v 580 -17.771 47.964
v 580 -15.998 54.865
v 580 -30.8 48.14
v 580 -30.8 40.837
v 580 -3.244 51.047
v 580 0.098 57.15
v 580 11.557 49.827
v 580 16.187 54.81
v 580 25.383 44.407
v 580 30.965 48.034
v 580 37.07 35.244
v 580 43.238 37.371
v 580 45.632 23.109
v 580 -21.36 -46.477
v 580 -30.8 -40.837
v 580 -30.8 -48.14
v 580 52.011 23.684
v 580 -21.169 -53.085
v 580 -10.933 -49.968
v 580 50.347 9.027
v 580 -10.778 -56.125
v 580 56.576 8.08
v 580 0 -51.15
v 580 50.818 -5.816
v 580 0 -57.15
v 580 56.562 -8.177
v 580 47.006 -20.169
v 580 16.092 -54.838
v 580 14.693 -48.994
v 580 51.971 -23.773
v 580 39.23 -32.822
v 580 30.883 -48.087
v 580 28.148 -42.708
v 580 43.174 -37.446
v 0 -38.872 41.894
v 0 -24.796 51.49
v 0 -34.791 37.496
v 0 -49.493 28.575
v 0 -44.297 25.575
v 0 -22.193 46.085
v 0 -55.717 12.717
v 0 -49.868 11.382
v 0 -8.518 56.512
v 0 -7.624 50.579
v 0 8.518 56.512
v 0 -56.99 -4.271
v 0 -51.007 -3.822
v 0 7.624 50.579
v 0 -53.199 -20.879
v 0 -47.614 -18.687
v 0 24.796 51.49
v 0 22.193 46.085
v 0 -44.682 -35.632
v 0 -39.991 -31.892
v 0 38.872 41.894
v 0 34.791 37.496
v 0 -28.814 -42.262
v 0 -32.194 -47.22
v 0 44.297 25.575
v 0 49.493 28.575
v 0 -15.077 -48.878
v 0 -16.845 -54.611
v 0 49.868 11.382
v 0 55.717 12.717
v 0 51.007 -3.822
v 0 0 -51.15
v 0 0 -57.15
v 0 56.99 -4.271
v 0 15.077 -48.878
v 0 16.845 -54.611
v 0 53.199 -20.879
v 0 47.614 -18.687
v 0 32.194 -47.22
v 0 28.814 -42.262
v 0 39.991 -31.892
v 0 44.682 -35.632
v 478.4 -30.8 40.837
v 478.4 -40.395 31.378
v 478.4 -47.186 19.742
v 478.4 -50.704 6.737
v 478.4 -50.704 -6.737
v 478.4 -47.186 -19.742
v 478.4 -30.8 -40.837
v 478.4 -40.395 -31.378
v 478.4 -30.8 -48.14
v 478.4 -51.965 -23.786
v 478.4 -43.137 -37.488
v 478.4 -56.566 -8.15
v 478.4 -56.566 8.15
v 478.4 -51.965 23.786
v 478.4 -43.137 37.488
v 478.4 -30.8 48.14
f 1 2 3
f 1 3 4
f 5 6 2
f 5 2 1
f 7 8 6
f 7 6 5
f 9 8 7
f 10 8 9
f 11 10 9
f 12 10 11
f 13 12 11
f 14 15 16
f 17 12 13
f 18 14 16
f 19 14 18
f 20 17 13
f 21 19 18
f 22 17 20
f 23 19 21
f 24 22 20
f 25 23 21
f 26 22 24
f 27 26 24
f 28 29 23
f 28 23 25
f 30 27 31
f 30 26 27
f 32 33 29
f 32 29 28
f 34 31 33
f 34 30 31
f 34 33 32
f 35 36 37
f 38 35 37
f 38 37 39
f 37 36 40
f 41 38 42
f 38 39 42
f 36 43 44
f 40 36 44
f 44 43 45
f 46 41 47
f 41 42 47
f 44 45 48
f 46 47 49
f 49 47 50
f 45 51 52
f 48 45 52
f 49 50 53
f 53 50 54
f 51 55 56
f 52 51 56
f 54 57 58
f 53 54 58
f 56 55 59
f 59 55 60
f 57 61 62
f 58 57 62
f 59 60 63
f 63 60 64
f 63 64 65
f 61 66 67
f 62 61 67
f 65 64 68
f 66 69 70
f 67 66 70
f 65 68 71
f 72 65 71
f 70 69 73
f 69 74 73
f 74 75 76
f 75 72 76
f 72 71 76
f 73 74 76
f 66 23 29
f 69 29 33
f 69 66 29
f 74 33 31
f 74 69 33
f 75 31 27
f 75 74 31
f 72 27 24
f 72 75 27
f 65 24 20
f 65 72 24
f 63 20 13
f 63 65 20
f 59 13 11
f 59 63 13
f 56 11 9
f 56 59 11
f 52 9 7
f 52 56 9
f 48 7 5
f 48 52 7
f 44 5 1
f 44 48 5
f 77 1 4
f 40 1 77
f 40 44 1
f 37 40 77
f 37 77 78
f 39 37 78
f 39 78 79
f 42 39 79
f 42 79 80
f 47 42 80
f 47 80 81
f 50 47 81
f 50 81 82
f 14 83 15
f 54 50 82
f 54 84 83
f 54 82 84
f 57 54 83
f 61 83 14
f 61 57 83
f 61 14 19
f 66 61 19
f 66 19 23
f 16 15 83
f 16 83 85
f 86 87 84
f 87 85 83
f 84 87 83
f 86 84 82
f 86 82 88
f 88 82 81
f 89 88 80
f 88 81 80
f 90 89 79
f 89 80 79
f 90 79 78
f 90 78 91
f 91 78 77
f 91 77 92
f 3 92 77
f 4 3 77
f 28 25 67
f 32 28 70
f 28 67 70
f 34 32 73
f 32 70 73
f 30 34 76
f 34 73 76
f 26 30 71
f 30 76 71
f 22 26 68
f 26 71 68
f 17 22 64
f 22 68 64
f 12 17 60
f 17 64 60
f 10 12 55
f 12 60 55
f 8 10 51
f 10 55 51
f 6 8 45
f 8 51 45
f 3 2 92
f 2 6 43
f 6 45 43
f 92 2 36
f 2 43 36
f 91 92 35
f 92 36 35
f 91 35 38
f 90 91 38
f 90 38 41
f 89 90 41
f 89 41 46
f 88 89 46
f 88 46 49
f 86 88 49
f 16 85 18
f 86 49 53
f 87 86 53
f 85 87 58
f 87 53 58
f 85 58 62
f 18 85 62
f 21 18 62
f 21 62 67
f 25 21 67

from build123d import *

# Parameters (mm, degrees)
CROQUIS1_R              = 57.15
CROQUIS1_R_2            = 51.15
SALIENTE_EXTRUIR1_DEPTH = 580
CORTAR_EXTRUIR1_START   = -101.6
CORTAR_EXTRUIR1_DEPTH   = 101.6


with BuildPart() as part:
    # Croquis1 → Saliente-Extruir1 (new body)
    with BuildSketch(Plane(origin=(0, 0, 0), x_dir=(0, 0, -1), z_dir=(1, 0, 0))):
        Circle(CROQUIS1_R)
        Circle(CROQUIS1_R_2, mode=Mode.SUBTRACT)
    extrude(amount=SALIENTE_EXTRUIR1_DEPTH)

    # Croquis2 → Cortar-Extruir1 (cut)
    with BuildSketch(Plane(origin=(580, 0, 0), x_dir=(0, 0, -1), z_dir=(1, 0, 0)).offset(CORTAR_EXTRUIR1_START)):
        with BuildLine():
            Line((-48.140237847, -30.8), (48.140237847, -30.8))
            ThreePointArc((48.140237847, -30.8), (0, -57.15), (-48.140237847, -30.8))
        make_face()
    extrude(amount=CORTAR_EXTRUIR1_DEPTH, mode=Mode.SUBTRACT)


solid = part.part
